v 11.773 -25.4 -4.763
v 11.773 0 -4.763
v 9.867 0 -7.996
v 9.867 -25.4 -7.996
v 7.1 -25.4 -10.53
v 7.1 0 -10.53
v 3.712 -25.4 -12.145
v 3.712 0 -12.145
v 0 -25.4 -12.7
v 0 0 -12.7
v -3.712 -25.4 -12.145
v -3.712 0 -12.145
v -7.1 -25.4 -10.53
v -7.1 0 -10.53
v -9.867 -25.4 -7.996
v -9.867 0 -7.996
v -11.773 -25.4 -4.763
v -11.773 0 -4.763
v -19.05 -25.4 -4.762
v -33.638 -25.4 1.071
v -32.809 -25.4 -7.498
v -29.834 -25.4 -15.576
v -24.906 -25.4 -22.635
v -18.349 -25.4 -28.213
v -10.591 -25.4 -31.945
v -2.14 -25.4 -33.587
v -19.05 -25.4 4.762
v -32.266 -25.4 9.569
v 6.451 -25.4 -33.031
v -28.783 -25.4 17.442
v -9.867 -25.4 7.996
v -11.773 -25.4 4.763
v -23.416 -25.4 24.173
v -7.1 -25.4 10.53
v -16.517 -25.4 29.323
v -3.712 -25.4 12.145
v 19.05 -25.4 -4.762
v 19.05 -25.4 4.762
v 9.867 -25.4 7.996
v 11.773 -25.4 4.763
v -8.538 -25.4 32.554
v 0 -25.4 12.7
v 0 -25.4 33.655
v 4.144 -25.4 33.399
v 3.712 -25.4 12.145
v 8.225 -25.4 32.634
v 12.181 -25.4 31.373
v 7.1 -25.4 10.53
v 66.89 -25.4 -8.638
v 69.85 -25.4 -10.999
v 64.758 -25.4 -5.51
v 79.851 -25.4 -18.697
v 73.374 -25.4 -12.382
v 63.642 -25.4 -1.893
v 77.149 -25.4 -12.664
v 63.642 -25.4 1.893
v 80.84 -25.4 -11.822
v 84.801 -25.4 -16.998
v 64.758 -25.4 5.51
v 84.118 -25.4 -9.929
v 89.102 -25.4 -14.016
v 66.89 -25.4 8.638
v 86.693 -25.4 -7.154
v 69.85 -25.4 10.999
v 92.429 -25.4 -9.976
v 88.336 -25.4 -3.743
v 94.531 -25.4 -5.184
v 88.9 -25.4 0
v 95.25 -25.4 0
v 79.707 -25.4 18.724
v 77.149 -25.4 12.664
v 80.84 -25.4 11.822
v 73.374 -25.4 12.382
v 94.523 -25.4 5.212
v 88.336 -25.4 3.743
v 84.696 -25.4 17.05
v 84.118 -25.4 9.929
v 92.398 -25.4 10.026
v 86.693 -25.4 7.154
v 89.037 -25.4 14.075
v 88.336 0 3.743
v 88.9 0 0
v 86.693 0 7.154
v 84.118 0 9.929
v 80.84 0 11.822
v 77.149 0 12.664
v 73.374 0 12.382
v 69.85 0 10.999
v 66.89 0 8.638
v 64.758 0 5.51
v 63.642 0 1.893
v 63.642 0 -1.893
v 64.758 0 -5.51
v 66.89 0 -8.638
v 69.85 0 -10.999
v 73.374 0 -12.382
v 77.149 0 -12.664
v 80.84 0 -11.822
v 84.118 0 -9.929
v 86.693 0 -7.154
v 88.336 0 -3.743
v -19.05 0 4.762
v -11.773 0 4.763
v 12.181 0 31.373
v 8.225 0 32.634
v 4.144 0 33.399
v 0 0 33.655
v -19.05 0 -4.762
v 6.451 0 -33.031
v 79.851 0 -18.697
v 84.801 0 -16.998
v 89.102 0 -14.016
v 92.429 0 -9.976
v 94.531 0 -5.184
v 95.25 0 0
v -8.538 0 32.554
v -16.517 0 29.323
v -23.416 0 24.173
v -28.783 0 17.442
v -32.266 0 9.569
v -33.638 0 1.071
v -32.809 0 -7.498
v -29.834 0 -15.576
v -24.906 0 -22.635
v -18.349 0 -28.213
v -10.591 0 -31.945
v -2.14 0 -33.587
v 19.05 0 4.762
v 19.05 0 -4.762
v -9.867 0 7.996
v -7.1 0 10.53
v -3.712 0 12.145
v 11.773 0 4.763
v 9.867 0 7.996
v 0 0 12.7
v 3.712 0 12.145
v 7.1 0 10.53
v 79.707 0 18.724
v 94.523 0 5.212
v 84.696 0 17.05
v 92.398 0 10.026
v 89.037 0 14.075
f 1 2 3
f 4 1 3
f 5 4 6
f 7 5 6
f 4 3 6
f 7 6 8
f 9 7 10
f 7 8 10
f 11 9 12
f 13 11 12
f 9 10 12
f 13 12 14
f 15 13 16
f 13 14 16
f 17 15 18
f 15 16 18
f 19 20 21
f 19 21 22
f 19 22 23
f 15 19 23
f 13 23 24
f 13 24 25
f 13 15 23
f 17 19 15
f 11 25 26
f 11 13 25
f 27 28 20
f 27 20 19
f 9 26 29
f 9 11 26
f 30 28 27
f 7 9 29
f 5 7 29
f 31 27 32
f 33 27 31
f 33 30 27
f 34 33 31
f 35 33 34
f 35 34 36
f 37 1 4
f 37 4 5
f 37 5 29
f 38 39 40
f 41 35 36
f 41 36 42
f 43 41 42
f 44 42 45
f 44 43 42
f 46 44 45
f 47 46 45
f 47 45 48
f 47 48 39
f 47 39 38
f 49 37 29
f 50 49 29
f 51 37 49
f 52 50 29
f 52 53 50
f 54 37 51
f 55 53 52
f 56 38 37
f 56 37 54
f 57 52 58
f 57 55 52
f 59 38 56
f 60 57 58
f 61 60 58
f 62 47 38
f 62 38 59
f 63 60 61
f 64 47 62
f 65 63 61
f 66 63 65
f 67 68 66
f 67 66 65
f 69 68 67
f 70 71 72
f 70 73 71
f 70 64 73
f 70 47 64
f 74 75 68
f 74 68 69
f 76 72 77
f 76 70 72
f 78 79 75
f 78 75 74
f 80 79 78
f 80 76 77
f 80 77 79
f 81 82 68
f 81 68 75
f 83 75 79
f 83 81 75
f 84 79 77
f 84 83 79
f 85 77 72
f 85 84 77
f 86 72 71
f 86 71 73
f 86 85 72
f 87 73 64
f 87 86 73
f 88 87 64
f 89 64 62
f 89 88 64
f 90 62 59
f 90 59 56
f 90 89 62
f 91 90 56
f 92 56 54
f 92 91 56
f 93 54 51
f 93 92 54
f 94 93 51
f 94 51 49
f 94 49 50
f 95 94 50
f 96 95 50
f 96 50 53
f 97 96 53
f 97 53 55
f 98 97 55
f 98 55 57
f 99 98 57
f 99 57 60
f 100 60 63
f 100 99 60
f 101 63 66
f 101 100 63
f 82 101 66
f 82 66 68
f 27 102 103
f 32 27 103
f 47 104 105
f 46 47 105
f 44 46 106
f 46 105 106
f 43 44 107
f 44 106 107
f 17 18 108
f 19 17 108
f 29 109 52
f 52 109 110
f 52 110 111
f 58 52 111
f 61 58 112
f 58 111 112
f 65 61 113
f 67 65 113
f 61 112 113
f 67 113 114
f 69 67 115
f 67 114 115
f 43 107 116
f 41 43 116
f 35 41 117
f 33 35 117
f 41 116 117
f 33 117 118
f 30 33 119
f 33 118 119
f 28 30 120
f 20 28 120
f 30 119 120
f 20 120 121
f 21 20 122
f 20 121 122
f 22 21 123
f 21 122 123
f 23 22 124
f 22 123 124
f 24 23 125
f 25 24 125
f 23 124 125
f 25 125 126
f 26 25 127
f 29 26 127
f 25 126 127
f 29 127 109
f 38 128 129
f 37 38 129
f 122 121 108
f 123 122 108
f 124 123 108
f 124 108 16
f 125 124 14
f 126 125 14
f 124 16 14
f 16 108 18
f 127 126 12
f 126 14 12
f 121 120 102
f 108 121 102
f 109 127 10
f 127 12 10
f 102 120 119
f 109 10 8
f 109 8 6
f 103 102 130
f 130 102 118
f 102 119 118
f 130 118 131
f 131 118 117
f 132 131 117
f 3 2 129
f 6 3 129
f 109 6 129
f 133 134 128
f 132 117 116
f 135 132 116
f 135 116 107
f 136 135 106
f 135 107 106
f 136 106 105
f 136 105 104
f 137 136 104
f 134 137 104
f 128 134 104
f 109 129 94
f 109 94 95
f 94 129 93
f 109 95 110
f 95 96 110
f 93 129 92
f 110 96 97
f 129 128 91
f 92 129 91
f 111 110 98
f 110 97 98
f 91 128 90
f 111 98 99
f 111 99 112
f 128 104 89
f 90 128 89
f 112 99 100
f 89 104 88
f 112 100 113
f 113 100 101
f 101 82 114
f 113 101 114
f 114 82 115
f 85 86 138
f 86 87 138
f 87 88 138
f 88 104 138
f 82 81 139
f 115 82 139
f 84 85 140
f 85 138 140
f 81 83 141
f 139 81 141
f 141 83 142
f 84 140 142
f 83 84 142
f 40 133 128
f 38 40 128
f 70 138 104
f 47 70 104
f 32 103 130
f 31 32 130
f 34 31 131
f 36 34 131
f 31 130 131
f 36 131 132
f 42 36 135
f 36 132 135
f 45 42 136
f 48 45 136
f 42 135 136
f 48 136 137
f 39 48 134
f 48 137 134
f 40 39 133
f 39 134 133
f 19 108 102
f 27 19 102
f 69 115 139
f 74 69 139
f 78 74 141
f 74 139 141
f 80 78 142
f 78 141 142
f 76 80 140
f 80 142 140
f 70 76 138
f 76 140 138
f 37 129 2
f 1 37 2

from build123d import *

# Parameters (mm, degrees)
F1_DEPTH = 25.4
F0_R     = 12.7
F2_DEPTH = 25.4


# Not quite as in the source:
# - the program builds the solid bodies; features that only make, move or delete a surface that nothing else refers to are left out


with BuildPart() as f1:
    # F0 (on Front) → F1 (new body)
    with BuildSketch(Plane.XZ):
        with BuildLine():
            Line((12.1809959468, 31.3732746576), (0, 33.655))
            ThreePointArc((0, 33.655), (-33.498646558, -3.2403246414), (6.4505416667, -33.0310389968))
            ThreePointArc((6.4505416667, -33.0310389968), (25.9783756689, -21.3958646146), (33.655, 0))
            ThreePointArc((33.655, 0), (27.7723823572, 19.0093083305), (12.1809959468, 31.3732746576))
        make_face()
        with BuildLine():
            ThreePointArc((-11.7732150983, 4.7625), (0, 12.7), (11.7732150983, 4.7625))
            Line((11.7732150983, 4.7625), (19.05, 4.7625))
            Line((19.05, 4.7625), (19.05, -4.7625))
            Line((19.05, -4.7625), (11.7732150983, -4.7625))
            ThreePointArc((11.7732150983, -4.7625), (0, -12.7), (-11.7732150983, -4.7625))
            Line((-11.7732150983, -4.7625), (-19.05, -4.7625))
            Line((-19.05, -4.7625), (-19.05, 4.7625))
            Line((-19.05, 4.7625), (-11.7732150983, 4.7625))
        make_face(mode=Mode.SUBTRACT)
    extrude(amount=F1_DEPTH)

    # F0 (on Front) → F2 (join)
    with BuildSketch(Plane.XZ):
        with BuildLine():
            Line((12.1809959468, 31.3732746576), (0, 33.655))
            ThreePointArc((0, 33.655), (-33.498646558, -3.2403246414), (6.4505416667, -33.0310389968))
            ThreePointArc((6.4505416667, -33.0310389968), (25.9783756689, -21.3958646146), (33.655, 0))
            ThreePointArc((33.655, 0), (27.7723823572, 19.0093083305), (12.1809959468, 31.3732746576))
        make_face()
        with BuildLine():
            ThreePointArc((-11.7732150983, 4.7625), (0, 12.7), (11.7732150983, 4.7625))
            Line((11.7732150983, 4.7625), (19.05, 4.7625))
            Line((19.05, 4.7625), (19.05, -4.7625))
            Line((19.05, -4.7625), (11.7732150983, -4.7625))
            ThreePointArc((11.7732150983, -4.7625), (0, -12.7), (-11.7732150983, -4.7625))
            Line((-11.7732150983, -4.7625), (-19.05, -4.7625))
            Line((-19.05, -4.7625), (-19.05, 4.7625))
            Line((-19.05, 4.7625), (-11.7732150983, 4.7625))
        make_face(mode=Mode.SUBTRACT)
        with BuildLine():
            ThreePointArc((12.1809959468, 31.3732746576), (6.1964290683, 33.0796507207), (0, 33.655))
            Line((0, 33.655), (12.1809959468, 31.3732746576))
        make_face()
        with BuildLine():
            ThreePointArc((33.655, 0), (25.9783756689, -21.3958646146), (6.4505416667, -33.0310389968))
            Line((6.4505416667, -33.0310389968), (79.85125, -18.6968145265))
            ThreePointArc((79.85125, -18.6968145265), (57.1501407243, -0.0732227913), (79.7074126802, 18.7243305966))
            Line((79.7074126802, 18.7243305966), (12.1809959468, 31.3732746576))
            ThreePointArc((12.1809959468, 31.3732746576), (27.7723823572, 19.0093083305), (33.655, 0))
        make_face()
        with BuildLine():
            ThreePointArc((79.7074126802, 18.7243305966), (57.1501407243, -0.0732227913), (79.85125, -18.6968145265))
            ThreePointArc((79.85125, -18.6968145265), (90.9047409447, -12.110866763), (95.25, 0))
            ThreePointArc((95.25, 0), (90.8580815859, 12.167298148), (79.7074126802, 18.7243305966))
        make_face()
        with Locations((76.2, 0)):
            Circle(F0_R, mode=Mode.SUBTRACT)
    extrude(amount=F2_DEPTH)


solid = f1.part
